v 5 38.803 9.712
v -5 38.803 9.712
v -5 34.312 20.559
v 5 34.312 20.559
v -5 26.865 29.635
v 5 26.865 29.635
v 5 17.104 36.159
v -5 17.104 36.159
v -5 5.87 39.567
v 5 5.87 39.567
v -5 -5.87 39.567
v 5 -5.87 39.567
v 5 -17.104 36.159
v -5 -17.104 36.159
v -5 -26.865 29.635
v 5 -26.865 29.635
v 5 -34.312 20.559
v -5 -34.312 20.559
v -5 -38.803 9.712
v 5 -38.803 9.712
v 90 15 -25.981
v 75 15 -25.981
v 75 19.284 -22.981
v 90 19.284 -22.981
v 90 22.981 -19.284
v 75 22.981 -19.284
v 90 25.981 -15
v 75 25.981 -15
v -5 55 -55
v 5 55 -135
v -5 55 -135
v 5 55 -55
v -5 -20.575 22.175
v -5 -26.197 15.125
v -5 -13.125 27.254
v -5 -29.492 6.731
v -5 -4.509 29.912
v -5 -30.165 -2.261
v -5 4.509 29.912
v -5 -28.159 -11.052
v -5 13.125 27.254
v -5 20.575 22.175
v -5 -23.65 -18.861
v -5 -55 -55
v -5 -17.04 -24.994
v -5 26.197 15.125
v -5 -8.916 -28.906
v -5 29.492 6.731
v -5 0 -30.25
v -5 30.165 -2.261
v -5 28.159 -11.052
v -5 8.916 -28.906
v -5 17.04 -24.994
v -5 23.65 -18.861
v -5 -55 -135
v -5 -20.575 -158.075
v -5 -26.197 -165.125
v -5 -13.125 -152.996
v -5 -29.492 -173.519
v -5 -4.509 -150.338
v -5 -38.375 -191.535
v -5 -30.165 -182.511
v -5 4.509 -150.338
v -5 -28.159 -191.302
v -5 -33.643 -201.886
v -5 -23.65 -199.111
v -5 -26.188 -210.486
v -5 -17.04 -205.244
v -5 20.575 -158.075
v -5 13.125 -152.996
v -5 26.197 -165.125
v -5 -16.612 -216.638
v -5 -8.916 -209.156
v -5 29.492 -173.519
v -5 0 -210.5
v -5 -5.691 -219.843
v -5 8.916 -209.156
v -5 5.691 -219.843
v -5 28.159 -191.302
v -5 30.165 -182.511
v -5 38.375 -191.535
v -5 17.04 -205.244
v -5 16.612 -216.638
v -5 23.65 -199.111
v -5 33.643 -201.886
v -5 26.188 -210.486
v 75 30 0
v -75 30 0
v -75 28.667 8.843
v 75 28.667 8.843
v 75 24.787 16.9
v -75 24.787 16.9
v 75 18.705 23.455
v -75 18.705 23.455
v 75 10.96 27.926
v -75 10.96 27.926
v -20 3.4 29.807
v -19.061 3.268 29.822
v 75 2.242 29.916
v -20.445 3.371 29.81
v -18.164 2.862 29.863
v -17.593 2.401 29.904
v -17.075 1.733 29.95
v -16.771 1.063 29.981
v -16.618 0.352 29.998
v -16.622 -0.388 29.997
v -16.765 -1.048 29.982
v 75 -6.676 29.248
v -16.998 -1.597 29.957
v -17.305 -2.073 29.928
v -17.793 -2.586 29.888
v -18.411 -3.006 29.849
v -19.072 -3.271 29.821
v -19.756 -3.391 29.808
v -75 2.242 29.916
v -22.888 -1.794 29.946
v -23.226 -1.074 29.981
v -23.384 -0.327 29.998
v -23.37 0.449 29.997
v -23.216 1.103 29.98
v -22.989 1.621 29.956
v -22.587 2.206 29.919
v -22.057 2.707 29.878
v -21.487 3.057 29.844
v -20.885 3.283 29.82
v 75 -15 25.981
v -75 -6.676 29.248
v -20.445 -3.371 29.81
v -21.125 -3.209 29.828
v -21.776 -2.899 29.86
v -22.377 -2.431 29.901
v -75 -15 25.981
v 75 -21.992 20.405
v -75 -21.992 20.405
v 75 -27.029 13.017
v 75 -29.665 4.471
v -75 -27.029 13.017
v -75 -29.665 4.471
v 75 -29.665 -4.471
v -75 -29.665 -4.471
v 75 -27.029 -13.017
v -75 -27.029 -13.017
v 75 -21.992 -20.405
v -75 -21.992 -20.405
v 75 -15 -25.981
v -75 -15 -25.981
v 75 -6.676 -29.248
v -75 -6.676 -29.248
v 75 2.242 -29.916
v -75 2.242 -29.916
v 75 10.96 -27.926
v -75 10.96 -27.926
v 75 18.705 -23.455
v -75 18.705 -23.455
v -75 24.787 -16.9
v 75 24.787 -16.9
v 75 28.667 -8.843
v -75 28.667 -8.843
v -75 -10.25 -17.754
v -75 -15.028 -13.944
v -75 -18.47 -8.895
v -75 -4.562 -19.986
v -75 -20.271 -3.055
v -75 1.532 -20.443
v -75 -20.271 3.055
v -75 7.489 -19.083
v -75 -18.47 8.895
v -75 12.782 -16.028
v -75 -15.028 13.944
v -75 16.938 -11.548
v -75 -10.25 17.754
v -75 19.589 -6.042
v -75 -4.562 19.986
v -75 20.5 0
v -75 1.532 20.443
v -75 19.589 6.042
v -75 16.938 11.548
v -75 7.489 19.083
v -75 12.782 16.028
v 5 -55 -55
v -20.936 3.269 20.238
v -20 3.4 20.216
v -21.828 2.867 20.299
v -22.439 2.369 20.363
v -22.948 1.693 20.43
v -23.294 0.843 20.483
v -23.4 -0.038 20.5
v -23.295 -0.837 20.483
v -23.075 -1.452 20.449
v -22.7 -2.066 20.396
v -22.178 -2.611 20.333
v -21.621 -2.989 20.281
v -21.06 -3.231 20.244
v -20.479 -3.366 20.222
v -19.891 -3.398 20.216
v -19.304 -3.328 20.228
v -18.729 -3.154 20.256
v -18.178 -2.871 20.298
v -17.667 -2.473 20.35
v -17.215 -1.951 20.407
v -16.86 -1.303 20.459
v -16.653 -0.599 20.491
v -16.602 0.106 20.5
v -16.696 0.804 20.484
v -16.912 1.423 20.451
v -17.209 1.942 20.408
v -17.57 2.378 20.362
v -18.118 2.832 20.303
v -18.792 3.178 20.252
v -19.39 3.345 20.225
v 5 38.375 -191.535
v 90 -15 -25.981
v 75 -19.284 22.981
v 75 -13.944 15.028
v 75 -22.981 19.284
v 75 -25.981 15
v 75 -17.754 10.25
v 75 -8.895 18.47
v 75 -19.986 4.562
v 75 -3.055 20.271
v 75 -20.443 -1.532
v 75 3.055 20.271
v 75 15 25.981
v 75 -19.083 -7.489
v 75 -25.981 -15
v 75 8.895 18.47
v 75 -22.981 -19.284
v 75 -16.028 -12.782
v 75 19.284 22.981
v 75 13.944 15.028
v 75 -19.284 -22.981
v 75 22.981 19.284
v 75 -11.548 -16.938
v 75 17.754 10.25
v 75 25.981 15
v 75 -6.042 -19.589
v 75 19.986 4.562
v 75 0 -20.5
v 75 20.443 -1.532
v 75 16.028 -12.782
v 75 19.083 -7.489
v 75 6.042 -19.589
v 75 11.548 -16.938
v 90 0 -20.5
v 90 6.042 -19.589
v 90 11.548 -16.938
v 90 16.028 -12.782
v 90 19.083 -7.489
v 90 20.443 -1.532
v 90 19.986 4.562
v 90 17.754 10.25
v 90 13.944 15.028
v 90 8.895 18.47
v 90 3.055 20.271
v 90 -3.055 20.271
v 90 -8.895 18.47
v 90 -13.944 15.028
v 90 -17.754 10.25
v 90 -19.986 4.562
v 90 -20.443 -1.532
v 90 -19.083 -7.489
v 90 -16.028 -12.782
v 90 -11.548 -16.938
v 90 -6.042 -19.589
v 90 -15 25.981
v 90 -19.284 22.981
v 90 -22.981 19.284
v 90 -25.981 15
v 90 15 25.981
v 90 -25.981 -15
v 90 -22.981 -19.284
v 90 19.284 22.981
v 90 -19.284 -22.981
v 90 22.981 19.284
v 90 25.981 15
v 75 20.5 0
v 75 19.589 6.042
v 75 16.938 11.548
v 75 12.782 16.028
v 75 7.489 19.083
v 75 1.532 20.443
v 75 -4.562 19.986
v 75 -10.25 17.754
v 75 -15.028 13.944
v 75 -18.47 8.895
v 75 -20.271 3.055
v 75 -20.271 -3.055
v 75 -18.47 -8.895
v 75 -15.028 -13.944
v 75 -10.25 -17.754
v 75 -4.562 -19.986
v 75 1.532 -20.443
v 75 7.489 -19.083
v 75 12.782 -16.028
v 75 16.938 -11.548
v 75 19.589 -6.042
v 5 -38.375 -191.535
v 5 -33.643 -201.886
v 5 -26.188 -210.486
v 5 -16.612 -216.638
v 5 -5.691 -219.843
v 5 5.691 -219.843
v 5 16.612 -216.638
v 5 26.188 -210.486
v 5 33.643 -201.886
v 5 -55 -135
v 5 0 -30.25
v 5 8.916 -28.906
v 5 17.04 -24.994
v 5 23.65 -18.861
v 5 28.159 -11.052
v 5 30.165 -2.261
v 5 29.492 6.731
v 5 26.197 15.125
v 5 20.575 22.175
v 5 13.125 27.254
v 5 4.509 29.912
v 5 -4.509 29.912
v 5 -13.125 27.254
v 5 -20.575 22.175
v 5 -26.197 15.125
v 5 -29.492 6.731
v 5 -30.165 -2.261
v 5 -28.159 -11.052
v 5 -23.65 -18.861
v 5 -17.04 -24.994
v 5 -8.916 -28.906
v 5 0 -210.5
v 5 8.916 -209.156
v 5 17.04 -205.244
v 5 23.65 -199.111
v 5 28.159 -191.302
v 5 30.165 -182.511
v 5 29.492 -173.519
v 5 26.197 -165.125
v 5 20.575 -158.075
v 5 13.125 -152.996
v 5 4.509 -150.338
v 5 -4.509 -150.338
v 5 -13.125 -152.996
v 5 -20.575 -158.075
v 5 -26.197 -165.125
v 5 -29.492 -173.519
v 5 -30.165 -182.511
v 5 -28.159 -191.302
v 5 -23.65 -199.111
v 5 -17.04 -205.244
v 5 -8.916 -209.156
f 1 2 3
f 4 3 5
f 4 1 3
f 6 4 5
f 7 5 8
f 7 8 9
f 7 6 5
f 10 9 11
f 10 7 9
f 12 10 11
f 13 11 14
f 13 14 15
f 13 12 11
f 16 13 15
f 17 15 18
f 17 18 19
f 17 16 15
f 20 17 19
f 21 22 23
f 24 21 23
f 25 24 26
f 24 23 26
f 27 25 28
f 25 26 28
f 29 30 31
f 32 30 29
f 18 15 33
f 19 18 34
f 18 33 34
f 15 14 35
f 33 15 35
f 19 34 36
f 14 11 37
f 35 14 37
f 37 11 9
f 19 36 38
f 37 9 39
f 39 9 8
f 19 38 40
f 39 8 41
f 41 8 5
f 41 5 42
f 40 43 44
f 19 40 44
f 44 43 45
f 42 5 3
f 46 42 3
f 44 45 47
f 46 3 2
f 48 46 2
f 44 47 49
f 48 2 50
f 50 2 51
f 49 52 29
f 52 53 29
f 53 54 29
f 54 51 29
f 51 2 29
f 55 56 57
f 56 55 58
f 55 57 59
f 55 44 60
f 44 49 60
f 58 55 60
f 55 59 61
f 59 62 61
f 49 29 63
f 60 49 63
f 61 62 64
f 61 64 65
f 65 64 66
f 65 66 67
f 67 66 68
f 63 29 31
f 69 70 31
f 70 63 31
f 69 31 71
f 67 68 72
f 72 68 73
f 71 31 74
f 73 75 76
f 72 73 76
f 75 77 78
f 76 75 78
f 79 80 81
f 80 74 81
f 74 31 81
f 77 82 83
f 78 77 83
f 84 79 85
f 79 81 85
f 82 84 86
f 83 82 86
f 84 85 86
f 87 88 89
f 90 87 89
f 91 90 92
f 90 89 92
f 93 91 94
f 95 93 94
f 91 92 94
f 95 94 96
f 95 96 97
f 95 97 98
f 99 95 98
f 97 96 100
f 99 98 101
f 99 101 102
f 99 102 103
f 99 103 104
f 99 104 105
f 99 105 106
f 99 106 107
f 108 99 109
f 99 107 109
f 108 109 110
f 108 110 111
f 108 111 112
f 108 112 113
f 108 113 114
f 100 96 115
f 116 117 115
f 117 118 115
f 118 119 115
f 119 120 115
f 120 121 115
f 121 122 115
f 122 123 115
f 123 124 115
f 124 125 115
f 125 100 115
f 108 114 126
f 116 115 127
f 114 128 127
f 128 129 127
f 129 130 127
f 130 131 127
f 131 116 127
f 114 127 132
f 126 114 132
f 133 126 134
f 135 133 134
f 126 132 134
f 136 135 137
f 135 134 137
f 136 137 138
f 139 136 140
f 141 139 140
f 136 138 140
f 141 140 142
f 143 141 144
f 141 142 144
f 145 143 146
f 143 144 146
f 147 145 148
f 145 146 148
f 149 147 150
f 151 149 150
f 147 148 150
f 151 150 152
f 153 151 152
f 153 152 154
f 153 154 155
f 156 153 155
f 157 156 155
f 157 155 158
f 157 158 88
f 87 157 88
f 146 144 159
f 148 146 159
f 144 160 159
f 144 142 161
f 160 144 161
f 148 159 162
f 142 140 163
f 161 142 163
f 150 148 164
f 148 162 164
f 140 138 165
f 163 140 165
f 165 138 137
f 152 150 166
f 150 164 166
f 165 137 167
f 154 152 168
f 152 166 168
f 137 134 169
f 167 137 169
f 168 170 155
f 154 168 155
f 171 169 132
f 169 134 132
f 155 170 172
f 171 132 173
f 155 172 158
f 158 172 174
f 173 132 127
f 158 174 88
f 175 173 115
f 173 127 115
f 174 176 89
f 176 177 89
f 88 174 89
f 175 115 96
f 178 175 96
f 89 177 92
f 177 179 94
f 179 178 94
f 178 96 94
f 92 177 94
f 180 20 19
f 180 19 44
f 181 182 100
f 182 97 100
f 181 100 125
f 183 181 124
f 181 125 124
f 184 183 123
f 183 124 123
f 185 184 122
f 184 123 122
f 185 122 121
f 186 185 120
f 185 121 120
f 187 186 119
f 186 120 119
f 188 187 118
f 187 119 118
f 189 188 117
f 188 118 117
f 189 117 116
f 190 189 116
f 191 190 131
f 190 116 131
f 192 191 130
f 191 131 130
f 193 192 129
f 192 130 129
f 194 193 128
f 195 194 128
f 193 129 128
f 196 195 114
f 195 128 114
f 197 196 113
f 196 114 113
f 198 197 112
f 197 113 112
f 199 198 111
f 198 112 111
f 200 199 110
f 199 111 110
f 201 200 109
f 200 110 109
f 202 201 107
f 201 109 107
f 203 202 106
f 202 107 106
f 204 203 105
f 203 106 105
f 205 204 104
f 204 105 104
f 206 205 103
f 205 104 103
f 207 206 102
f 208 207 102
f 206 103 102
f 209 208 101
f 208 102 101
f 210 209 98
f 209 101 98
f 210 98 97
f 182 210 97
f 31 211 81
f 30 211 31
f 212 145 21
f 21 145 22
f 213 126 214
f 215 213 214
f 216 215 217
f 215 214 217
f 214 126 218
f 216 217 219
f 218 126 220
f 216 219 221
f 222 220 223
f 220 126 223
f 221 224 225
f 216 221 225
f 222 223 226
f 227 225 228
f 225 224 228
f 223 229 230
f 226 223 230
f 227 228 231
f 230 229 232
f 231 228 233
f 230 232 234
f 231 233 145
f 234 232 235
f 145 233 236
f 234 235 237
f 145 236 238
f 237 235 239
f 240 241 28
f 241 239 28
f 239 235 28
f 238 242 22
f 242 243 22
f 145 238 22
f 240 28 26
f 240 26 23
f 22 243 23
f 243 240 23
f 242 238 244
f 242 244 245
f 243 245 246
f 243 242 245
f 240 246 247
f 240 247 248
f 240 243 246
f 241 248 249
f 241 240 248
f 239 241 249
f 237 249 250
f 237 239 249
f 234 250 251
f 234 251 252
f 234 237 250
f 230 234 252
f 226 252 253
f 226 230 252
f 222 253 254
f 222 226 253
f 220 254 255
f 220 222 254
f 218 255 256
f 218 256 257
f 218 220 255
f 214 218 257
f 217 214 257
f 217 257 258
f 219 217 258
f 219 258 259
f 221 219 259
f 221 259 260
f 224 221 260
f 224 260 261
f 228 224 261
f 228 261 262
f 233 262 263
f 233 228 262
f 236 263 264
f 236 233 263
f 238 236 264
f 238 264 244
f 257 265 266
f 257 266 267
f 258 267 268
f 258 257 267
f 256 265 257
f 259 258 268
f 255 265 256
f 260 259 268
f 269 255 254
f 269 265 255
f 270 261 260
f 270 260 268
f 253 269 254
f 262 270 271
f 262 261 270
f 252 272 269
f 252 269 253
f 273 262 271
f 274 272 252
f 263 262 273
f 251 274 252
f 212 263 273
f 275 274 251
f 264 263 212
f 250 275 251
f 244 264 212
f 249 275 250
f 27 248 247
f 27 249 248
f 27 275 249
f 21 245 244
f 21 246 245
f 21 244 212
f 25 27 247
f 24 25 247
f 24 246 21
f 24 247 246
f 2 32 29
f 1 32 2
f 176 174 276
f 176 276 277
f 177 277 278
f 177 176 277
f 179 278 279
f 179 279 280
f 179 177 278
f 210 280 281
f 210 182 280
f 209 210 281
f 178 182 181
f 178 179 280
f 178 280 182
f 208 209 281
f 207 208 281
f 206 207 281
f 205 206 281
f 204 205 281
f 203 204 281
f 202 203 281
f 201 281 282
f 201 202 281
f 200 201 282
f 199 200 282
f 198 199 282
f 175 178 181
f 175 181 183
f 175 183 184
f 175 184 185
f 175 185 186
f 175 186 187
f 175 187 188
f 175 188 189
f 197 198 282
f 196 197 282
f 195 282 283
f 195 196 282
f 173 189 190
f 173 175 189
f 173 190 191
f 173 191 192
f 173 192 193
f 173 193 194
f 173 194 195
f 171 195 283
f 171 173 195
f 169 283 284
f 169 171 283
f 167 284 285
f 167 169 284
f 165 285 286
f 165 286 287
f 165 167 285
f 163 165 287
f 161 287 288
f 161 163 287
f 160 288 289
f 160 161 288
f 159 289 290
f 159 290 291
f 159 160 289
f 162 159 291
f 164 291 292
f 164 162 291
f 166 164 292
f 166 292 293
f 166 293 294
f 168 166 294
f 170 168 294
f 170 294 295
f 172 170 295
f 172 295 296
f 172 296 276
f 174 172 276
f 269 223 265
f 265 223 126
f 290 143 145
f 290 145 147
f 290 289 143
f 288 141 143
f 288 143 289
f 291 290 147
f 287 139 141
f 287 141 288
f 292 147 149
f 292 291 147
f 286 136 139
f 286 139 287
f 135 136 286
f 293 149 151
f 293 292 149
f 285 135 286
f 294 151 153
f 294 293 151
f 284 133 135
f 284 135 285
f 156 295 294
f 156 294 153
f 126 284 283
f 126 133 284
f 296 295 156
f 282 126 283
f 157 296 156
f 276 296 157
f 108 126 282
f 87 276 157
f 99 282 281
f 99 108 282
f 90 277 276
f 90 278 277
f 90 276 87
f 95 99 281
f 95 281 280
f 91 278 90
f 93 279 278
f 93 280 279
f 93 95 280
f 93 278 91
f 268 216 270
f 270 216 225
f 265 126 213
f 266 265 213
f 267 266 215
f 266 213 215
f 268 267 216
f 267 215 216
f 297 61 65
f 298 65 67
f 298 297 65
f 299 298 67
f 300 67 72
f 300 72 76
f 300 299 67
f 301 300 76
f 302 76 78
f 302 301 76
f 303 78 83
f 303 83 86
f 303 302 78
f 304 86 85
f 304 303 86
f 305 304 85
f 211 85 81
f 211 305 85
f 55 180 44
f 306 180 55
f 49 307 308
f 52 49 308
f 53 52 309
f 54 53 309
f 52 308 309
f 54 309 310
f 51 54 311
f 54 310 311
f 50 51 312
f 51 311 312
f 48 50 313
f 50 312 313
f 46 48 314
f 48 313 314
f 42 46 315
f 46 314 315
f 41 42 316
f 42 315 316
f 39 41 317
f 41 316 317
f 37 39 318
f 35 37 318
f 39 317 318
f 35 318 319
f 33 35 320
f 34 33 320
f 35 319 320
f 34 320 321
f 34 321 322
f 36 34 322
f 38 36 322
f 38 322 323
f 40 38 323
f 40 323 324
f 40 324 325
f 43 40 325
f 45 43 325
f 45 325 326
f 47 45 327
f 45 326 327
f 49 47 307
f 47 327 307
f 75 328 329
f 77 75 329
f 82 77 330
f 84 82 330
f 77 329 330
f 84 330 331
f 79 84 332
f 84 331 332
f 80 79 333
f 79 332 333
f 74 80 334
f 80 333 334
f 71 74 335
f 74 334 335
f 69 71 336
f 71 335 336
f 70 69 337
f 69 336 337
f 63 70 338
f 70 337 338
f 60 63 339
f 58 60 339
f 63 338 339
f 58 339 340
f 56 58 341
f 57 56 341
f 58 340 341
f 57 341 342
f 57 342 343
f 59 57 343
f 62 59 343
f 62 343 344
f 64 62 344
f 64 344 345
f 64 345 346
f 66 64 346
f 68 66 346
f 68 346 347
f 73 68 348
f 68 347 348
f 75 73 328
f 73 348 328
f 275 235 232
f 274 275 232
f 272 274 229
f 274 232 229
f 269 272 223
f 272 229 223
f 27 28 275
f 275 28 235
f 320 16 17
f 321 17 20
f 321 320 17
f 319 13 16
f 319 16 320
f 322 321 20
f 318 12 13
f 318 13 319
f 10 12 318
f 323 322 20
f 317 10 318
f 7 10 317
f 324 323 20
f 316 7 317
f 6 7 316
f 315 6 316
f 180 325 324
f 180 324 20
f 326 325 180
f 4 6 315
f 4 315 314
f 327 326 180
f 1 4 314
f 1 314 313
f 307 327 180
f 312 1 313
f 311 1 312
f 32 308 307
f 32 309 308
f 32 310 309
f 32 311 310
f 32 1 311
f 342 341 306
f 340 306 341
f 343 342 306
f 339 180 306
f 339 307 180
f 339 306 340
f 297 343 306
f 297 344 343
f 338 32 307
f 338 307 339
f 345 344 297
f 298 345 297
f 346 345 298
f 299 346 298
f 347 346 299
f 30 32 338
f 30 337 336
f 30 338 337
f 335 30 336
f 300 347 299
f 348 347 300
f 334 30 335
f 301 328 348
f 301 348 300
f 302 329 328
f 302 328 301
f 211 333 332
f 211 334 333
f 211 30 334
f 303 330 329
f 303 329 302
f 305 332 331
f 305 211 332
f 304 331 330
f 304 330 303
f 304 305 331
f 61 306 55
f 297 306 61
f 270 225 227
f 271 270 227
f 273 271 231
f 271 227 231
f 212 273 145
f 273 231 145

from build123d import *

# Parameters (mm, degrees)
ROND_R                      = 30
ROND_R_2                    = 20.5
EL_MENT_M_CANO_SOUD_1_DEPTH = 150
ESQUISSE2_W                 = 3.4
ESQUISSE2_H                 = 30
ESQUISSE5_R                 = 20.5
BOSS_EXTRU_1_DEPTH          = 15
BOSS_EXTRU_2_START          = -70
ESQUISSE6_R                 = 40
ESQUISSE6_R_2               = 30.25
BOSS_EXTRU_2_DEPTH          = 10
ESQUISSE7_R                 = 40
ESQUISSE7_R_2               = 30.25
BOSS_EXTRU_3_DEPTH          = 10


with BuildPart() as part:
    # rond → Elément mécano-soudé1 (new body)
    with BuildSketch(Plane.YZ.offset(-75)):
        Circle(ROND_R)
        Circle(ROND_R_2, mode=Mode.SUBTRACT)
    extrude(amount=EL_MENT_M_CANO_SOUD_1_DEPTH)

    # Esquisse2 → Trou taraudé M8x1.251 (revolve, cut)
    with BuildSketch(Plane.YZ.offset(-20)):
        with Locations((1.7, 15)):
            Rectangle(ESQUISSE2_W, ESQUISSE2_H)
    revolve(axis=Axis((-20, 0, -6.35), (0, 0, 1)), mode=Mode.SUBTRACT)


with BuildPart() as body_2:
    # Esquisse5 → Boss.-Extru.1 (new body)
    with BuildSketch(Plane(origin=(75, 0, 0), x_dir=(0, 0, -1), z_dir=(1, 0, 0))):
        with BuildLine():
            Line((15, 25.980762114), (-15, 25.980762114))
            ThreePointArc((-15, 25.980762114), (-21.213203436, 21.213203436), (-25.980762114, 15))
            Line((-25.980762114, 15), (-25.980762114, -15))
            ThreePointArc((-25.980762114, -15), (-21.213203436, -21.213203436), (-15, -25.980762114))
            Line((-15, -25.980762114), (15, -25.980762114))
            ThreePointArc((15, -25.980762114), (21.213203436, -21.213203436), (25.980762114, -15))
            Line((25.980762114, -15), (25.980762114, 15))
            ThreePointArc((25.980762114, 15), (21.213203436, 21.213203436), (15, 25.980762114))
        make_face()
        Circle(ESQUISSE5_R, mode=Mode.SUBTRACT)
    extrude(amount=BOSS_EXTRU_1_DEPTH)


with BuildPart() as body_3:
    # Esquisse6 → Boss.-Extru.2 (new body)
    with BuildSketch(Plane(origin=(75, 0, 0), x_dir=(0, 0, -1), z_dir=(1, 0, 0)).offset(BOSS_EXTRU_2_START)):
        Circle(ESQUISSE6_R)
        Circle(ESQUISSE6_R_2, mode=Mode.SUBTRACT)
    extrude(amount=-BOSS_EXTRU_2_DEPTH)


with BuildPart() as body_4:
    # Esquisse7 → Boss.-Extru.3 (new body)
    with BuildSketch(Plane(origin=(5, 0, 0), x_dir=(0, 0, -1), z_dir=(1, 0, 0))):
        with BuildLine():
            Line((55, 55), (-9.71211648, 38.803025571))
            ThreePointArc((-9.71211648, 38.803025571), (24.612144774, 31.531608421), (40, 0))
            ThreePointArc((40, 0), (24.612144774, -31.531608421), (-9.71211648, -38.803025571))
            Line((-9.71211648, -38.803025571), (55, -55))
            Line((55, -55), (135, -55))
            Line((135, -55), (191.534749126, -38.375179963))
            ThreePointArc((191.534749126, -38.375179963), (140.25, 0), (191.534749126, 38.375179963))
            Line((191.534749126, 38.375179963), (135, 55))
            Line((135, 55), (55, 55))
        make_face()
        with Locations((180.25, 0)):
            Circle(ESQUISSE7_R)
        with Locations((180.25, 0)):
            Circle(ESQUISSE7_R_2, mode=Mode.SUBTRACT)
        Circle(ESQUISSE7_R)
        Circle(ESQUISSE7_R_2, mode=Mode.SUBTRACT)
    extrude(amount=-BOSS_EXTRU_3_DEPTH)


solid = Compound([part.part, body_2.part, body_4.part])
